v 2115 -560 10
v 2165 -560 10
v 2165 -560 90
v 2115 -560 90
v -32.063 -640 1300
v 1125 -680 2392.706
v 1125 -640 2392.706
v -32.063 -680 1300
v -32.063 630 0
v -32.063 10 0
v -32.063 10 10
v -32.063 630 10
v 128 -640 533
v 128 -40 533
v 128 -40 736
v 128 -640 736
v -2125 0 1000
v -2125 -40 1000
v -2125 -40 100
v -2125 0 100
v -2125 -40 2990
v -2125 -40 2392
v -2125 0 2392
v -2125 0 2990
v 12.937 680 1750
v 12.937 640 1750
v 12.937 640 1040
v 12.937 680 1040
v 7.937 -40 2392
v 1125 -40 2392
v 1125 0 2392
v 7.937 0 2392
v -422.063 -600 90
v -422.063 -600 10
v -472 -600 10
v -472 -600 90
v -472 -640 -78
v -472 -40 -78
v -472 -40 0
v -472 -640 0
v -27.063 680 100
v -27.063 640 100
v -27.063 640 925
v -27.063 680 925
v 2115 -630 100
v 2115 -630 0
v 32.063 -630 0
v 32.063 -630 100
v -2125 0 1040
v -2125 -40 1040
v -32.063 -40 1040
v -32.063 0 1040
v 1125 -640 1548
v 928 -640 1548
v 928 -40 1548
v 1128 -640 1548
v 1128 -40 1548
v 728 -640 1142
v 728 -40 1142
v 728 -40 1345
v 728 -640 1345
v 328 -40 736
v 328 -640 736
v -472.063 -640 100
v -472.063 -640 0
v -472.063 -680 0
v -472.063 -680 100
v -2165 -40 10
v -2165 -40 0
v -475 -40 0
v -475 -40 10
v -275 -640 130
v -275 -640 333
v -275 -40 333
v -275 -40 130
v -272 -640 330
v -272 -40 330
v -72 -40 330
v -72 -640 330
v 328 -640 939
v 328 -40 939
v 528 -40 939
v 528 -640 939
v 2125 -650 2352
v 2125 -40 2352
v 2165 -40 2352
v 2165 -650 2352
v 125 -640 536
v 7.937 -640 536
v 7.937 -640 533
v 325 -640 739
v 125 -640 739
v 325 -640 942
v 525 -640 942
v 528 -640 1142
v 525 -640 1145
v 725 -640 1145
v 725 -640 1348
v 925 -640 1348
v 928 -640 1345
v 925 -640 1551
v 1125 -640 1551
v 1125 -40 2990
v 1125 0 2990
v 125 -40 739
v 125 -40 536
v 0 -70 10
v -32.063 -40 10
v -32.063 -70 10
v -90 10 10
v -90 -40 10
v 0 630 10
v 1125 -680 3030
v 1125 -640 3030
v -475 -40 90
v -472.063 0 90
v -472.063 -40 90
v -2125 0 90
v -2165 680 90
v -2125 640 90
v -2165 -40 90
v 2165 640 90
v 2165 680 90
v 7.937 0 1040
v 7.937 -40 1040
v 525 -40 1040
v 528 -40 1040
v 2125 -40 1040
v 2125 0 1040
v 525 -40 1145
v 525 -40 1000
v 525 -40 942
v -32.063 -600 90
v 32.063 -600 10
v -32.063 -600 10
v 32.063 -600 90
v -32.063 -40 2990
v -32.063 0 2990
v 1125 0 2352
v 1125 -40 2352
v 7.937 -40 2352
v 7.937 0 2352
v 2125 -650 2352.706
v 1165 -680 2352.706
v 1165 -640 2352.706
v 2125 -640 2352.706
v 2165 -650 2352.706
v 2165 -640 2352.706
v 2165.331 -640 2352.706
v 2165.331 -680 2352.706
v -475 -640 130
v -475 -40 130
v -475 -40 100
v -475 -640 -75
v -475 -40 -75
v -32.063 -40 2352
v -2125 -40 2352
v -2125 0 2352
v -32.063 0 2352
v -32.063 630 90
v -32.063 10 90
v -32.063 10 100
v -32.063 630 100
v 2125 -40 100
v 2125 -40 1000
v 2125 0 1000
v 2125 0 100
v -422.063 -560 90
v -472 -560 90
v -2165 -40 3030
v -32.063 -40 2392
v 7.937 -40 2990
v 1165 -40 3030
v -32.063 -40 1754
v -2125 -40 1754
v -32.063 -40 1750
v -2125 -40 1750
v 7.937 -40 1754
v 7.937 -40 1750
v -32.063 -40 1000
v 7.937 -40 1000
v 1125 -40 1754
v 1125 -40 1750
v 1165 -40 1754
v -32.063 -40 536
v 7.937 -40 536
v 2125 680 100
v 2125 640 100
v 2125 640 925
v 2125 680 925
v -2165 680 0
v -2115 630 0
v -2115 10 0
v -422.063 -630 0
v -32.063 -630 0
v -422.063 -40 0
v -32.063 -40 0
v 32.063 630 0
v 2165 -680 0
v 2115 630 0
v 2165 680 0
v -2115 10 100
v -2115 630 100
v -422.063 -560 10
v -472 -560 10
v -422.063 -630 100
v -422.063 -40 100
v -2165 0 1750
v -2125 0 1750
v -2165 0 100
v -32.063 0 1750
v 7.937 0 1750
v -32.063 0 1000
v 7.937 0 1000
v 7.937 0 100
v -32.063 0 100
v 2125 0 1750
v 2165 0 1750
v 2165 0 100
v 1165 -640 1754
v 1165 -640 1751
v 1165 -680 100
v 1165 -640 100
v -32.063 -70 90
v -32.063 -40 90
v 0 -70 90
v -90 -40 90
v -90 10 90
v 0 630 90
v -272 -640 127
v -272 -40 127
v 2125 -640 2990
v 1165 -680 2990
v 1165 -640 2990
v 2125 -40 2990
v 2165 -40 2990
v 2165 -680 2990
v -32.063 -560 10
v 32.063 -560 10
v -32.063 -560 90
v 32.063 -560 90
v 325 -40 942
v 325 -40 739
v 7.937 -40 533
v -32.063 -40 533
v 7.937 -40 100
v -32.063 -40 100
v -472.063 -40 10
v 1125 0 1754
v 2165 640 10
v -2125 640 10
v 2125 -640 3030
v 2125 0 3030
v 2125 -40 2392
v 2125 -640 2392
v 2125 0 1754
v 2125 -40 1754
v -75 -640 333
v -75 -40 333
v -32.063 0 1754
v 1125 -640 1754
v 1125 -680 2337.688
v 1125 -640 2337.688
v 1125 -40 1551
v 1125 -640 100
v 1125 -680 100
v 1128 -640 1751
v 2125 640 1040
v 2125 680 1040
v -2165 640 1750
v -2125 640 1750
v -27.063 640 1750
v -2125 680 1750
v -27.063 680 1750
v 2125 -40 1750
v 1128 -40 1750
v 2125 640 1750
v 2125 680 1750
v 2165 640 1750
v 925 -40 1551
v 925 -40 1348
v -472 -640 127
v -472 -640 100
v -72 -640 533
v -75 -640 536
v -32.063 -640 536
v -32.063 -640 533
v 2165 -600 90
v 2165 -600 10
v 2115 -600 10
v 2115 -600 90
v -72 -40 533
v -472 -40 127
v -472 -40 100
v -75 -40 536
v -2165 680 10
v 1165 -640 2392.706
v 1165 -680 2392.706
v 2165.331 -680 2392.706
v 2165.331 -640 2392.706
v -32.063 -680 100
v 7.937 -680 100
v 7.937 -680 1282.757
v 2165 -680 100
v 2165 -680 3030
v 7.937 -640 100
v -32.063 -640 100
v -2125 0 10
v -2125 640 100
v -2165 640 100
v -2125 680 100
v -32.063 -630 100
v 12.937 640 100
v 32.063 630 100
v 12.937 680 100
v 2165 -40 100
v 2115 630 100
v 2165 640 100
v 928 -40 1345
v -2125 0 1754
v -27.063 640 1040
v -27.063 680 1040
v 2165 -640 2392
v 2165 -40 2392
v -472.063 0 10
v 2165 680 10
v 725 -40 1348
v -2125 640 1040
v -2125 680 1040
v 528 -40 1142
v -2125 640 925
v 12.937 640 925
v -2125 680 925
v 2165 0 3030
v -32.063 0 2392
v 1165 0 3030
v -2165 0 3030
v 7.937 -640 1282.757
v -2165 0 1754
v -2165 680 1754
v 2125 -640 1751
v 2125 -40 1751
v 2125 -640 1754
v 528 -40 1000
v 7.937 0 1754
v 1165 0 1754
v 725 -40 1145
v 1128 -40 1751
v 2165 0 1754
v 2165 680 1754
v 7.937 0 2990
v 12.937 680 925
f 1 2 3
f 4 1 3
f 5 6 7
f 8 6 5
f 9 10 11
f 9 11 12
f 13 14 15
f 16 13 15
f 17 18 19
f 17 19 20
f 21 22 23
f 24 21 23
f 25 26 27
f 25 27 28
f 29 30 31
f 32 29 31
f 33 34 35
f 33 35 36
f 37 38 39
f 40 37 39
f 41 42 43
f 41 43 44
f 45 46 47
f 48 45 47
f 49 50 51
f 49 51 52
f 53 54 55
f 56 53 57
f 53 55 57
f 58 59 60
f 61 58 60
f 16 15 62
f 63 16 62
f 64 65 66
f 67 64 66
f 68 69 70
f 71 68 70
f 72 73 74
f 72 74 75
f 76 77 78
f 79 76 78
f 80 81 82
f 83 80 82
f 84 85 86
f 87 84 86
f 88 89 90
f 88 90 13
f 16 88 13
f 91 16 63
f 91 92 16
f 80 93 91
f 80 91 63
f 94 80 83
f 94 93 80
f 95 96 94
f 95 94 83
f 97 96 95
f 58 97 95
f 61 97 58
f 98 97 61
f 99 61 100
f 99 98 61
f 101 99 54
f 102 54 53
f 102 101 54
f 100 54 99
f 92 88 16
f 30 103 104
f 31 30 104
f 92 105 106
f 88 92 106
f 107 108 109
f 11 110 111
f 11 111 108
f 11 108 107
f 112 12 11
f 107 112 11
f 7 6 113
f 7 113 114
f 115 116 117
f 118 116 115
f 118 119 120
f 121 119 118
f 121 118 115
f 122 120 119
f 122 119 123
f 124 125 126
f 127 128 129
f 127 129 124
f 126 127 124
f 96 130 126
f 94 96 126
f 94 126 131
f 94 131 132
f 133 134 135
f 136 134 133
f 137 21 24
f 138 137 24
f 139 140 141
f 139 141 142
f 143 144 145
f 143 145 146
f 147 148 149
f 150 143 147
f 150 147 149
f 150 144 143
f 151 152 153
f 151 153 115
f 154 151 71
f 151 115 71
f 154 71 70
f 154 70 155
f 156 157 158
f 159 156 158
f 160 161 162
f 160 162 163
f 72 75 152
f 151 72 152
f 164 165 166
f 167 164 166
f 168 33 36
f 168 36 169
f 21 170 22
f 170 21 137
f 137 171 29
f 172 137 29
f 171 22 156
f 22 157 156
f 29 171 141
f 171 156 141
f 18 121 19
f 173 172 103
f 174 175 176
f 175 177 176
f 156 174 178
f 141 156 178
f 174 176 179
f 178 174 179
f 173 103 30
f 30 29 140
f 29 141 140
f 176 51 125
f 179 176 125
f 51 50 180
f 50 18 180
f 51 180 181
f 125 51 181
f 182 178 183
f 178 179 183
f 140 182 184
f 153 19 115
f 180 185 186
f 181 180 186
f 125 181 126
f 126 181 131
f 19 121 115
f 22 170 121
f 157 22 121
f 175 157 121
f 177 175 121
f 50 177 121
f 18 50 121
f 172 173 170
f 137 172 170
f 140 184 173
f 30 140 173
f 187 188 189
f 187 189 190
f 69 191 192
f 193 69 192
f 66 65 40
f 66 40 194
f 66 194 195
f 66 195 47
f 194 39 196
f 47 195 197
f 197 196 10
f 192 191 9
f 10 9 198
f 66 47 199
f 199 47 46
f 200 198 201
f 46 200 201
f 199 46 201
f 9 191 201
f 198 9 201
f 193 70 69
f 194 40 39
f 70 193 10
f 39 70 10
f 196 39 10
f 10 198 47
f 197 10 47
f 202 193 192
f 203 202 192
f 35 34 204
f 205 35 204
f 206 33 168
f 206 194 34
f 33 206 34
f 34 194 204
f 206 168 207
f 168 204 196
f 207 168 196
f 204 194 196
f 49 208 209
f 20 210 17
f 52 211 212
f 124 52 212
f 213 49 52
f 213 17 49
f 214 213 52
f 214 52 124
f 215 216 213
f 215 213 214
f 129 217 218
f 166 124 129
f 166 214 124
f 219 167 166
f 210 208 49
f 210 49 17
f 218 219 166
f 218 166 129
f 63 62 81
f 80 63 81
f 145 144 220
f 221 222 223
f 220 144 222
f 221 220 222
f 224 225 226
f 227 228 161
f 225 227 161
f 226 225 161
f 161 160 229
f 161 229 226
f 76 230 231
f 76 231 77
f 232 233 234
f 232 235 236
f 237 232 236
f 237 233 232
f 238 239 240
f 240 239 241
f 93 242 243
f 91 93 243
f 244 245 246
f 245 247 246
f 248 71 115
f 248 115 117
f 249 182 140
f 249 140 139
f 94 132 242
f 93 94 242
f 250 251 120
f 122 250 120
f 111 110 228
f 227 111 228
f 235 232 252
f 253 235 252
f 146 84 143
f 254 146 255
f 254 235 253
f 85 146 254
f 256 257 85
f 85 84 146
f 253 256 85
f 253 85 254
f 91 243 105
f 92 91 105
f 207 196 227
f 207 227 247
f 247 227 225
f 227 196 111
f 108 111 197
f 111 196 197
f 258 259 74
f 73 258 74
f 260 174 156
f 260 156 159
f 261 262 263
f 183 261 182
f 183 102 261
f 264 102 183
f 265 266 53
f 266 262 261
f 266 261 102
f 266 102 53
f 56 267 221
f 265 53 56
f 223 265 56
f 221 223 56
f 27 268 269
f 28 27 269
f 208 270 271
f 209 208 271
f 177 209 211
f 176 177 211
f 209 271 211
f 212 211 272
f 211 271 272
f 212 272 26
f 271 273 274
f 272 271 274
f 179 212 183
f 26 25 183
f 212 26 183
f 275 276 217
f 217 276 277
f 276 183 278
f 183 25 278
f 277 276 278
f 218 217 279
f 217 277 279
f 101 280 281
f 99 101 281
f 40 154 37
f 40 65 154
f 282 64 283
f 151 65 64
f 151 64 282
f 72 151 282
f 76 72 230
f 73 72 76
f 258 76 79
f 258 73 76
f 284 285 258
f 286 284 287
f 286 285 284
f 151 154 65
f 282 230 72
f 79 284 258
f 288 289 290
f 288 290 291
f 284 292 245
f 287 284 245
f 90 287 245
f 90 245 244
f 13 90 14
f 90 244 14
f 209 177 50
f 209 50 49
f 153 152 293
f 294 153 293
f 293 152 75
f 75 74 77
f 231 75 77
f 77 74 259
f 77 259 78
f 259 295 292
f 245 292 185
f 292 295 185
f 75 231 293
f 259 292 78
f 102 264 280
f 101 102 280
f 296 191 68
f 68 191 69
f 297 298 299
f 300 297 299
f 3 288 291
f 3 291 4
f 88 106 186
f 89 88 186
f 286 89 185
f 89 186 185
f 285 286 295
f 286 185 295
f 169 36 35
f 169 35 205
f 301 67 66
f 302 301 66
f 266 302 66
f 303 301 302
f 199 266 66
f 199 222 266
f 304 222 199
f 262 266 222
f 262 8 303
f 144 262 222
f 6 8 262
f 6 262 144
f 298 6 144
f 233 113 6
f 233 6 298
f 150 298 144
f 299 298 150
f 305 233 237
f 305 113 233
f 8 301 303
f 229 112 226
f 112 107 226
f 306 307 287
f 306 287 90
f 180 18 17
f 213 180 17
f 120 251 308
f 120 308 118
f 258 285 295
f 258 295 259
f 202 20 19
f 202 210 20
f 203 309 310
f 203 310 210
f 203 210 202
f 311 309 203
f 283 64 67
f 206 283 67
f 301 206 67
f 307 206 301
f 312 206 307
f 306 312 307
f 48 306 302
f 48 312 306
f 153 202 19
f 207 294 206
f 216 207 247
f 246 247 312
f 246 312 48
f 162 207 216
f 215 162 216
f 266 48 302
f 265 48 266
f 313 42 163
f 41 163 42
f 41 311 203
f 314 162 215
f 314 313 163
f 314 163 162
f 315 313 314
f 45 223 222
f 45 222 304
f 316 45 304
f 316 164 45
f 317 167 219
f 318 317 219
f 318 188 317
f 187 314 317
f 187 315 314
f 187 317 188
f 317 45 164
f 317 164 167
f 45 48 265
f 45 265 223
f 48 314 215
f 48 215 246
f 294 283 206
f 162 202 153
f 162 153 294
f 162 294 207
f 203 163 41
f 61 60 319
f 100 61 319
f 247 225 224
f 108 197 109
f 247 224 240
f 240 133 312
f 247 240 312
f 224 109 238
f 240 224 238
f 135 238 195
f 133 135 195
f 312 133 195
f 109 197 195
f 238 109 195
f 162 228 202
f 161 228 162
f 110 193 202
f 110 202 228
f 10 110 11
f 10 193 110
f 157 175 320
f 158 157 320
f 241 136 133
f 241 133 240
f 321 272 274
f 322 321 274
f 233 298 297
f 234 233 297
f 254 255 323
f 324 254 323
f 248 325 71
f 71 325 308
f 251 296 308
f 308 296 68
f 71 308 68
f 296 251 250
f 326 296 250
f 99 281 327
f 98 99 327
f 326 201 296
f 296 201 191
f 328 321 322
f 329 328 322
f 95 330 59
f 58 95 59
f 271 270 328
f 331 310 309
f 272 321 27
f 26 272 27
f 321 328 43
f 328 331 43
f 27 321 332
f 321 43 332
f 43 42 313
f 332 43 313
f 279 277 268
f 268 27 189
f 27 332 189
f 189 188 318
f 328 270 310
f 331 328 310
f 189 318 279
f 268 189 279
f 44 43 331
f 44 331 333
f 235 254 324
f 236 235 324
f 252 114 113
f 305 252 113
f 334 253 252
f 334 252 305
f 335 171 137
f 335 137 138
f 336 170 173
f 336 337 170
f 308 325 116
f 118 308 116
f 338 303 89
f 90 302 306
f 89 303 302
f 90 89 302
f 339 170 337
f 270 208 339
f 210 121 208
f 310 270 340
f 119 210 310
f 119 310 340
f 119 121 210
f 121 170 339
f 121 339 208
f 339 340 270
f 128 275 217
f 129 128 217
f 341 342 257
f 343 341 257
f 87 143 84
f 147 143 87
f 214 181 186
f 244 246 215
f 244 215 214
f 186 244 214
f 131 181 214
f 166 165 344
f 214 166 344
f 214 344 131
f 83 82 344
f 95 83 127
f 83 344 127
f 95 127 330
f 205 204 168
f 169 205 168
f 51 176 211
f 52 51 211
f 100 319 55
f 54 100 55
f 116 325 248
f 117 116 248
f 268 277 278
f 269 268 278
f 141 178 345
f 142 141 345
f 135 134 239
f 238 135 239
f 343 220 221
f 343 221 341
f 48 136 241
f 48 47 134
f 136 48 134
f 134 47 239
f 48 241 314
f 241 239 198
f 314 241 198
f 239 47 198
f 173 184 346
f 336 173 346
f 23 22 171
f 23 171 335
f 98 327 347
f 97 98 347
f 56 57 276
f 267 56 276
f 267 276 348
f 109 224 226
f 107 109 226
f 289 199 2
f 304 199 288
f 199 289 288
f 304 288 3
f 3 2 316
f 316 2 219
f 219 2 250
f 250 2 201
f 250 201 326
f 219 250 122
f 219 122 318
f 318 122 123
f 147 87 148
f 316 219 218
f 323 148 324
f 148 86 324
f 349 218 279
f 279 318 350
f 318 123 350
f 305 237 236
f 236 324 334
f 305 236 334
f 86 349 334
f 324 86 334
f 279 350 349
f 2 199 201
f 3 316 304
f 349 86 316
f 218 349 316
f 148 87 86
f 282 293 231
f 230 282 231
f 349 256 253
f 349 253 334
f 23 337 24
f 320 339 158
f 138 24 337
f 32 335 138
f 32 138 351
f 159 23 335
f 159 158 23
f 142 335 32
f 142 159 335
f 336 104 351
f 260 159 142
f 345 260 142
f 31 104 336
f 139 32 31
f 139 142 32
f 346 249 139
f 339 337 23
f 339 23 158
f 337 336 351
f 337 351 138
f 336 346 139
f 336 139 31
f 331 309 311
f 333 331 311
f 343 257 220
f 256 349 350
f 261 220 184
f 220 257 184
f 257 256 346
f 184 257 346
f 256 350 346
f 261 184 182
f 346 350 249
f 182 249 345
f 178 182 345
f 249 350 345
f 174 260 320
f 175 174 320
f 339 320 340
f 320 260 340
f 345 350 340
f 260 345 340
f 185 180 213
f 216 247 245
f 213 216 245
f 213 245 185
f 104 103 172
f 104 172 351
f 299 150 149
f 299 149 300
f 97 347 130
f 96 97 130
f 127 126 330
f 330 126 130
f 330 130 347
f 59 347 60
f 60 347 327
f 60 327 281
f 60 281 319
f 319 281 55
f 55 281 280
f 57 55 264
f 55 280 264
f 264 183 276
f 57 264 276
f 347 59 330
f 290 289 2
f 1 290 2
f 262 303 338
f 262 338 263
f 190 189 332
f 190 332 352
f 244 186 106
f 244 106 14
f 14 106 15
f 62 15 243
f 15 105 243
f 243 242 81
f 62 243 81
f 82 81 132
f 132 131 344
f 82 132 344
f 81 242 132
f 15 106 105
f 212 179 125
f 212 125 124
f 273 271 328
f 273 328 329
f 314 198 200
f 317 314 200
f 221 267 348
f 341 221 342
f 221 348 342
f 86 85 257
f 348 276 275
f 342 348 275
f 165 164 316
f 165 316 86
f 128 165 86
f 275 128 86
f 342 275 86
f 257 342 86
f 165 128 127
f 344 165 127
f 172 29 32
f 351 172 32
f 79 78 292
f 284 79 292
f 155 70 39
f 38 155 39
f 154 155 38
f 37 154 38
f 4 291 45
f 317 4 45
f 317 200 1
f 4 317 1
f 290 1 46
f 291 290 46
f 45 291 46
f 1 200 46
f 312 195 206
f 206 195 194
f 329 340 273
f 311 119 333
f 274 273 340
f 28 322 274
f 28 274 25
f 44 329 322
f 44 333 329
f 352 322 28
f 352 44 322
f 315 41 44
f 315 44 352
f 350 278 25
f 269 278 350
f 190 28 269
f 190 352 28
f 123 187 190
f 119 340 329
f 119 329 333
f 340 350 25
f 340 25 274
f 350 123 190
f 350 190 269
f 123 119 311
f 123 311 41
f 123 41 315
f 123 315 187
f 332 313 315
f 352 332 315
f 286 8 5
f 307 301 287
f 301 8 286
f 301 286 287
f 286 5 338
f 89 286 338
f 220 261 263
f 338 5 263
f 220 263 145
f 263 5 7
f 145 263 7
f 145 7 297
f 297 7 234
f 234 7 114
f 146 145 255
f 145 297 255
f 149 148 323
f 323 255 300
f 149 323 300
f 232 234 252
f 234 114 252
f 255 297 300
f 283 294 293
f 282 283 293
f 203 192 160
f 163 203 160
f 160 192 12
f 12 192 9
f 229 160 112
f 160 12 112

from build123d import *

# Parameters (mm, degrees)
F0_W          = 2082.9370811584
F0_H          = 620
F0_W_2        = 50
F0_H_2        = 590
F1_DEPTH      = 100
F2_W          = 40
F2_H          = 80
F3_DEPTH      = 1692.9370811584
F4_DEPTH      = 4330.001
F5_W          = 40
F5_H          = 80
F6_DEPTH      = 680.001
F8_W          = 90
F8_H          = 80
F9_DEPTH      = 630
F9_DEPTH_BACK = 70
F10_W         = 40
F10_H         = 40
F11_DEPTH     = 2930
F12_W         = 4330
F12_H         = 720
F13_DEPTH     = 4
F14_DEPTH     = 1650
F15_W         = 40
F15_H         = 40
F15_H_2       = 115
F16_DEPTH     = 4300
F20_DEPTH     = 600
F21_W         = 40
F21_H         = 40
F22_DEPTH     = 2930
F23_DEPTH     = 1200
F24_W         = 1000.3309154511
F24_H         = 40
F24_W_2       = 1000
F25_DEPTH     = 40
F17_W         = 40
F17_H         = 40
F26_DEPTH     = 610
F27_W         = 40
F27_H         = 40
F28_DEPTH     = 1275
F29_W         = 960
F29_H         = 1083.7077188492
F30_DEPTH     = 50
F31_W         = 40
F31_H         = 80
F32_DEPTH     = 2637


# Not quite as in the source:
# - a feature names something its author has since deleted; it is built from what else it names


with BuildPart() as f1:
    # F0 (on Top) → F1 (new body)
    with BuildSketch(Plane.XY):
        Polygon((2165, -680), (2165, 680), (-2165, 680), (-2165, -40), (-472.0629188416, -40), (-422.0629188416, -40), (-32.0629188416, -40), (-32.0629188416, -630), (-32.0629188416, -680), align=None)
        with Locations((-1073.5314594208, 320)):
            Rectangle(F0_W, F0_H, mode=Mode.SUBTRACT)
        Polygon((2115, 630), (2115, -630), (32.0629188416, -630), (32.0629188416, -9.9903011755), (32.0629188416, 630), align=None, mode=Mode.SUBTRACT)
        with Locations((-447.0629188416, -335)):
            Rectangle(F0_W_2, F0_H_2)
        Polygon((-472.0629188416, -680), (-32.0629188416, -680), (-32.0629188416, -630), (-422.0629188416, -630), (-472.0629188416, -630), align=None)
    extrude(amount=F1_DEPTH)

    # F2 (on face) → F3 (cut, through all)
    with BuildSketch(Plane(origin=(-2165, 0, 0), x_dir=(0, -1, 0), z_dir=(-1, 0, 0))):
        with Locations((20, 50)):
            Rectangle(F2_W, F2_H)
    extrude(amount=-F3_DEPTH, mode=Mode.SUBTRACT)

    # F2 (on face) → F4 (cut, through all)
    with BuildSketch(Plane(origin=(-2165, 0, 0), x_dir=(0, -1, 0), z_dir=(-1, 0, 0))):
        with Locations((-660, 50)):
            Rectangle(F2_W, F2_H)
    extrude(amount=-F4_DEPTH, mode=Mode.SUBTRACT)

    # F5 (on face) → F6 (cut, through all)
    with BuildSketch(Plane.XZ):
        with Locations((-2145, 50)):
            Rectangle(F5_W, F5_H)
    extrude(amount=-F6_DEPTH, mode=Mode.SUBTRACT)

    # F8 (on Front) → F9 (cut, two sides)
    with BuildSketch(Plane.XZ) as f9_sk:
        with Locations((-45, 50)):
            Rectangle(F8_W, F8_H)
    extrude(amount=-F9_DEPTH, mode=Mode.SUBTRACT)
    extrude(f9_sk.sketch, amount=F9_DEPTH_BACK, mode=Mode.SUBTRACT)

    # F10 (on face) → F11 (join)
    with BuildSketch(Plane.XY.offset(100)):
        with Locations((-2145, -20)):
            Rectangle(F10_W, F10_H)
        with Locations((-12.0629188416, -20)):
            Rectangle(F10_W, F10_H)
        with Locations((2145, -20)):
            Rectangle(F10_W, F10_H)
    extrude(amount=F11_DEPTH)

    # F12 (on offset) → F13 (join)
    with BuildSketch(Plane.XY.offset(1750)):
        with Locations((0, 320)):
            Rectangle(F12_W, F12_H)
    extrude(amount=F13_DEPTH)

    # F10 (on face) → F14 (join)
    with BuildSketch(Plane.XY.offset(100)):
        with Locations((-2145, 660)):
            Rectangle(F10_W, F10_H)
        with Locations((2145, 660)):
            Rectangle(F10_W, F10_H)
        with Locations((-7.0629188416, 660)):
            Rectangle(F10_W, F10_H)
        with Locations((-2145, -20)):
            Rectangle(F10_W, F10_H)
        with Locations((-12.0629188416, -20)):
            Rectangle(F10_W, F10_H)
        with Locations((2145, -20)):
            Rectangle(F10_W, F10_H)
    extrude(amount=F14_DEPTH)

    # F15 (on face) → F16 (join)
    with BuildSketch(Plane.YZ.offset(2165)):
        with Locations((-20, 3010)):
            Rectangle(F15_W, F15_H)
        with Locations((660, 982.5)):
            Rectangle(F15_W, F15_H_2)
        with Locations((-20, 1020)):
            Rectangle(F15_W, F15_H)
        with Locations((-20, 2372)):
            Rectangle(F15_W, F15_H)
    extrude(amount=-F16_DEPTH)

    # F19 (on offset) → F20 (join)
    with BuildSketch(Plane.XZ.offset(40)):
        Polygon((2125, 1751), (2125, 1754), (1125, 1754), (1125, 1551), (925, 1551), (925, 1348), (725, 1348), (725, 1145), (525, 1145), (525, 942), (325, 942), (325, 739), (125, 739), (125, 536), (-75, 536), (-75, 333), (-275, 333), (-275, 130), (-475, 130), (-475, -75), (-472, -78), (-472, 127), (-272, 127), (-272, 330), (-72, 330), (-72, 533), (128, 533), (128, 736), (328, 736), (328, 939), (528, 939), (528, 1142), (728, 1142), (728, 1345), (928, 1345), (928, 1548), (1128, 1548), (1128, 1751), align=None)
    extrude(amount=F20_DEPTH)

    # F21 (on face) → F22 (join)
    with BuildSketch(Plane.XY.offset(100)):
        with Locations((1145, -660)):
            Rectangle(F21_W, F21_H)
    extrude(amount=F22_DEPTH)

    # F21 (on face) → F23 (join)
    with BuildSketch(Plane.XY.offset(100)):
        with Locations((-12.0629188416, -660)):
            Rectangle(F21_W, F21_H)
    extrude(amount=F23_DEPTH)

    # F24 (on face) → F25 (join)
    with BuildSketch(Plane.XZ.offset(680)):
        Polygon((1125, 2392.7055740356), (-32.0629188416, 1300), (7.9370811584, 1300), (7.9370811584, 1282.7573162751), (1125, 2337.687742348), (1125, 2352.7055740356), align=None)
        with Locations((1665.1654577255, 2372.7055740356)):
            Rectangle(F24_W, F24_H)
        with Locations((1665, 3010)):
            Rectangle(F24_W_2, F24_H)
    extrude(amount=-F25_DEPTH)

    # F17 (on face) → F26 (join)
    with BuildSketch(Plane.XZ.offset(40)):
        with Locations((2145, 2372)):
            Rectangle(F17_W, F17_H)
        with Locations((2145, 3010)):
            Rectangle(F17_W, F17_H)
    extrude(amount=F26_DEPTH)

    # F27 (on face) → F28 (join)
    with BuildSketch(Plane.XY.offset(1754)):
        with Locations((1145, -20)):
            Rectangle(F27_W, F27_H)
    extrude(amount=F28_DEPTH)

    # F29 (on face) → F30 (cut)
    with BuildSketch(Plane(origin=(0, 0, 0), x_dir=(-1, 0, 0), z_dir=(0, 1, 0))):
        with Locations((-1645, 2488.1461405754)):
            Rectangle(F29_W, F29_H)
    extrude(amount=-F30_DEPTH, mode=Mode.SUBTRACT)

    # F31 (on face) → F32 (cut, through all)
    with BuildSketch(Plane.YZ.offset(2165)):
        with Locations((-580, 50)):
            Rectangle(F31_W, F31_H)
    extrude(amount=-F32_DEPTH, mode=Mode.SUBTRACT)


solid = f1.part
